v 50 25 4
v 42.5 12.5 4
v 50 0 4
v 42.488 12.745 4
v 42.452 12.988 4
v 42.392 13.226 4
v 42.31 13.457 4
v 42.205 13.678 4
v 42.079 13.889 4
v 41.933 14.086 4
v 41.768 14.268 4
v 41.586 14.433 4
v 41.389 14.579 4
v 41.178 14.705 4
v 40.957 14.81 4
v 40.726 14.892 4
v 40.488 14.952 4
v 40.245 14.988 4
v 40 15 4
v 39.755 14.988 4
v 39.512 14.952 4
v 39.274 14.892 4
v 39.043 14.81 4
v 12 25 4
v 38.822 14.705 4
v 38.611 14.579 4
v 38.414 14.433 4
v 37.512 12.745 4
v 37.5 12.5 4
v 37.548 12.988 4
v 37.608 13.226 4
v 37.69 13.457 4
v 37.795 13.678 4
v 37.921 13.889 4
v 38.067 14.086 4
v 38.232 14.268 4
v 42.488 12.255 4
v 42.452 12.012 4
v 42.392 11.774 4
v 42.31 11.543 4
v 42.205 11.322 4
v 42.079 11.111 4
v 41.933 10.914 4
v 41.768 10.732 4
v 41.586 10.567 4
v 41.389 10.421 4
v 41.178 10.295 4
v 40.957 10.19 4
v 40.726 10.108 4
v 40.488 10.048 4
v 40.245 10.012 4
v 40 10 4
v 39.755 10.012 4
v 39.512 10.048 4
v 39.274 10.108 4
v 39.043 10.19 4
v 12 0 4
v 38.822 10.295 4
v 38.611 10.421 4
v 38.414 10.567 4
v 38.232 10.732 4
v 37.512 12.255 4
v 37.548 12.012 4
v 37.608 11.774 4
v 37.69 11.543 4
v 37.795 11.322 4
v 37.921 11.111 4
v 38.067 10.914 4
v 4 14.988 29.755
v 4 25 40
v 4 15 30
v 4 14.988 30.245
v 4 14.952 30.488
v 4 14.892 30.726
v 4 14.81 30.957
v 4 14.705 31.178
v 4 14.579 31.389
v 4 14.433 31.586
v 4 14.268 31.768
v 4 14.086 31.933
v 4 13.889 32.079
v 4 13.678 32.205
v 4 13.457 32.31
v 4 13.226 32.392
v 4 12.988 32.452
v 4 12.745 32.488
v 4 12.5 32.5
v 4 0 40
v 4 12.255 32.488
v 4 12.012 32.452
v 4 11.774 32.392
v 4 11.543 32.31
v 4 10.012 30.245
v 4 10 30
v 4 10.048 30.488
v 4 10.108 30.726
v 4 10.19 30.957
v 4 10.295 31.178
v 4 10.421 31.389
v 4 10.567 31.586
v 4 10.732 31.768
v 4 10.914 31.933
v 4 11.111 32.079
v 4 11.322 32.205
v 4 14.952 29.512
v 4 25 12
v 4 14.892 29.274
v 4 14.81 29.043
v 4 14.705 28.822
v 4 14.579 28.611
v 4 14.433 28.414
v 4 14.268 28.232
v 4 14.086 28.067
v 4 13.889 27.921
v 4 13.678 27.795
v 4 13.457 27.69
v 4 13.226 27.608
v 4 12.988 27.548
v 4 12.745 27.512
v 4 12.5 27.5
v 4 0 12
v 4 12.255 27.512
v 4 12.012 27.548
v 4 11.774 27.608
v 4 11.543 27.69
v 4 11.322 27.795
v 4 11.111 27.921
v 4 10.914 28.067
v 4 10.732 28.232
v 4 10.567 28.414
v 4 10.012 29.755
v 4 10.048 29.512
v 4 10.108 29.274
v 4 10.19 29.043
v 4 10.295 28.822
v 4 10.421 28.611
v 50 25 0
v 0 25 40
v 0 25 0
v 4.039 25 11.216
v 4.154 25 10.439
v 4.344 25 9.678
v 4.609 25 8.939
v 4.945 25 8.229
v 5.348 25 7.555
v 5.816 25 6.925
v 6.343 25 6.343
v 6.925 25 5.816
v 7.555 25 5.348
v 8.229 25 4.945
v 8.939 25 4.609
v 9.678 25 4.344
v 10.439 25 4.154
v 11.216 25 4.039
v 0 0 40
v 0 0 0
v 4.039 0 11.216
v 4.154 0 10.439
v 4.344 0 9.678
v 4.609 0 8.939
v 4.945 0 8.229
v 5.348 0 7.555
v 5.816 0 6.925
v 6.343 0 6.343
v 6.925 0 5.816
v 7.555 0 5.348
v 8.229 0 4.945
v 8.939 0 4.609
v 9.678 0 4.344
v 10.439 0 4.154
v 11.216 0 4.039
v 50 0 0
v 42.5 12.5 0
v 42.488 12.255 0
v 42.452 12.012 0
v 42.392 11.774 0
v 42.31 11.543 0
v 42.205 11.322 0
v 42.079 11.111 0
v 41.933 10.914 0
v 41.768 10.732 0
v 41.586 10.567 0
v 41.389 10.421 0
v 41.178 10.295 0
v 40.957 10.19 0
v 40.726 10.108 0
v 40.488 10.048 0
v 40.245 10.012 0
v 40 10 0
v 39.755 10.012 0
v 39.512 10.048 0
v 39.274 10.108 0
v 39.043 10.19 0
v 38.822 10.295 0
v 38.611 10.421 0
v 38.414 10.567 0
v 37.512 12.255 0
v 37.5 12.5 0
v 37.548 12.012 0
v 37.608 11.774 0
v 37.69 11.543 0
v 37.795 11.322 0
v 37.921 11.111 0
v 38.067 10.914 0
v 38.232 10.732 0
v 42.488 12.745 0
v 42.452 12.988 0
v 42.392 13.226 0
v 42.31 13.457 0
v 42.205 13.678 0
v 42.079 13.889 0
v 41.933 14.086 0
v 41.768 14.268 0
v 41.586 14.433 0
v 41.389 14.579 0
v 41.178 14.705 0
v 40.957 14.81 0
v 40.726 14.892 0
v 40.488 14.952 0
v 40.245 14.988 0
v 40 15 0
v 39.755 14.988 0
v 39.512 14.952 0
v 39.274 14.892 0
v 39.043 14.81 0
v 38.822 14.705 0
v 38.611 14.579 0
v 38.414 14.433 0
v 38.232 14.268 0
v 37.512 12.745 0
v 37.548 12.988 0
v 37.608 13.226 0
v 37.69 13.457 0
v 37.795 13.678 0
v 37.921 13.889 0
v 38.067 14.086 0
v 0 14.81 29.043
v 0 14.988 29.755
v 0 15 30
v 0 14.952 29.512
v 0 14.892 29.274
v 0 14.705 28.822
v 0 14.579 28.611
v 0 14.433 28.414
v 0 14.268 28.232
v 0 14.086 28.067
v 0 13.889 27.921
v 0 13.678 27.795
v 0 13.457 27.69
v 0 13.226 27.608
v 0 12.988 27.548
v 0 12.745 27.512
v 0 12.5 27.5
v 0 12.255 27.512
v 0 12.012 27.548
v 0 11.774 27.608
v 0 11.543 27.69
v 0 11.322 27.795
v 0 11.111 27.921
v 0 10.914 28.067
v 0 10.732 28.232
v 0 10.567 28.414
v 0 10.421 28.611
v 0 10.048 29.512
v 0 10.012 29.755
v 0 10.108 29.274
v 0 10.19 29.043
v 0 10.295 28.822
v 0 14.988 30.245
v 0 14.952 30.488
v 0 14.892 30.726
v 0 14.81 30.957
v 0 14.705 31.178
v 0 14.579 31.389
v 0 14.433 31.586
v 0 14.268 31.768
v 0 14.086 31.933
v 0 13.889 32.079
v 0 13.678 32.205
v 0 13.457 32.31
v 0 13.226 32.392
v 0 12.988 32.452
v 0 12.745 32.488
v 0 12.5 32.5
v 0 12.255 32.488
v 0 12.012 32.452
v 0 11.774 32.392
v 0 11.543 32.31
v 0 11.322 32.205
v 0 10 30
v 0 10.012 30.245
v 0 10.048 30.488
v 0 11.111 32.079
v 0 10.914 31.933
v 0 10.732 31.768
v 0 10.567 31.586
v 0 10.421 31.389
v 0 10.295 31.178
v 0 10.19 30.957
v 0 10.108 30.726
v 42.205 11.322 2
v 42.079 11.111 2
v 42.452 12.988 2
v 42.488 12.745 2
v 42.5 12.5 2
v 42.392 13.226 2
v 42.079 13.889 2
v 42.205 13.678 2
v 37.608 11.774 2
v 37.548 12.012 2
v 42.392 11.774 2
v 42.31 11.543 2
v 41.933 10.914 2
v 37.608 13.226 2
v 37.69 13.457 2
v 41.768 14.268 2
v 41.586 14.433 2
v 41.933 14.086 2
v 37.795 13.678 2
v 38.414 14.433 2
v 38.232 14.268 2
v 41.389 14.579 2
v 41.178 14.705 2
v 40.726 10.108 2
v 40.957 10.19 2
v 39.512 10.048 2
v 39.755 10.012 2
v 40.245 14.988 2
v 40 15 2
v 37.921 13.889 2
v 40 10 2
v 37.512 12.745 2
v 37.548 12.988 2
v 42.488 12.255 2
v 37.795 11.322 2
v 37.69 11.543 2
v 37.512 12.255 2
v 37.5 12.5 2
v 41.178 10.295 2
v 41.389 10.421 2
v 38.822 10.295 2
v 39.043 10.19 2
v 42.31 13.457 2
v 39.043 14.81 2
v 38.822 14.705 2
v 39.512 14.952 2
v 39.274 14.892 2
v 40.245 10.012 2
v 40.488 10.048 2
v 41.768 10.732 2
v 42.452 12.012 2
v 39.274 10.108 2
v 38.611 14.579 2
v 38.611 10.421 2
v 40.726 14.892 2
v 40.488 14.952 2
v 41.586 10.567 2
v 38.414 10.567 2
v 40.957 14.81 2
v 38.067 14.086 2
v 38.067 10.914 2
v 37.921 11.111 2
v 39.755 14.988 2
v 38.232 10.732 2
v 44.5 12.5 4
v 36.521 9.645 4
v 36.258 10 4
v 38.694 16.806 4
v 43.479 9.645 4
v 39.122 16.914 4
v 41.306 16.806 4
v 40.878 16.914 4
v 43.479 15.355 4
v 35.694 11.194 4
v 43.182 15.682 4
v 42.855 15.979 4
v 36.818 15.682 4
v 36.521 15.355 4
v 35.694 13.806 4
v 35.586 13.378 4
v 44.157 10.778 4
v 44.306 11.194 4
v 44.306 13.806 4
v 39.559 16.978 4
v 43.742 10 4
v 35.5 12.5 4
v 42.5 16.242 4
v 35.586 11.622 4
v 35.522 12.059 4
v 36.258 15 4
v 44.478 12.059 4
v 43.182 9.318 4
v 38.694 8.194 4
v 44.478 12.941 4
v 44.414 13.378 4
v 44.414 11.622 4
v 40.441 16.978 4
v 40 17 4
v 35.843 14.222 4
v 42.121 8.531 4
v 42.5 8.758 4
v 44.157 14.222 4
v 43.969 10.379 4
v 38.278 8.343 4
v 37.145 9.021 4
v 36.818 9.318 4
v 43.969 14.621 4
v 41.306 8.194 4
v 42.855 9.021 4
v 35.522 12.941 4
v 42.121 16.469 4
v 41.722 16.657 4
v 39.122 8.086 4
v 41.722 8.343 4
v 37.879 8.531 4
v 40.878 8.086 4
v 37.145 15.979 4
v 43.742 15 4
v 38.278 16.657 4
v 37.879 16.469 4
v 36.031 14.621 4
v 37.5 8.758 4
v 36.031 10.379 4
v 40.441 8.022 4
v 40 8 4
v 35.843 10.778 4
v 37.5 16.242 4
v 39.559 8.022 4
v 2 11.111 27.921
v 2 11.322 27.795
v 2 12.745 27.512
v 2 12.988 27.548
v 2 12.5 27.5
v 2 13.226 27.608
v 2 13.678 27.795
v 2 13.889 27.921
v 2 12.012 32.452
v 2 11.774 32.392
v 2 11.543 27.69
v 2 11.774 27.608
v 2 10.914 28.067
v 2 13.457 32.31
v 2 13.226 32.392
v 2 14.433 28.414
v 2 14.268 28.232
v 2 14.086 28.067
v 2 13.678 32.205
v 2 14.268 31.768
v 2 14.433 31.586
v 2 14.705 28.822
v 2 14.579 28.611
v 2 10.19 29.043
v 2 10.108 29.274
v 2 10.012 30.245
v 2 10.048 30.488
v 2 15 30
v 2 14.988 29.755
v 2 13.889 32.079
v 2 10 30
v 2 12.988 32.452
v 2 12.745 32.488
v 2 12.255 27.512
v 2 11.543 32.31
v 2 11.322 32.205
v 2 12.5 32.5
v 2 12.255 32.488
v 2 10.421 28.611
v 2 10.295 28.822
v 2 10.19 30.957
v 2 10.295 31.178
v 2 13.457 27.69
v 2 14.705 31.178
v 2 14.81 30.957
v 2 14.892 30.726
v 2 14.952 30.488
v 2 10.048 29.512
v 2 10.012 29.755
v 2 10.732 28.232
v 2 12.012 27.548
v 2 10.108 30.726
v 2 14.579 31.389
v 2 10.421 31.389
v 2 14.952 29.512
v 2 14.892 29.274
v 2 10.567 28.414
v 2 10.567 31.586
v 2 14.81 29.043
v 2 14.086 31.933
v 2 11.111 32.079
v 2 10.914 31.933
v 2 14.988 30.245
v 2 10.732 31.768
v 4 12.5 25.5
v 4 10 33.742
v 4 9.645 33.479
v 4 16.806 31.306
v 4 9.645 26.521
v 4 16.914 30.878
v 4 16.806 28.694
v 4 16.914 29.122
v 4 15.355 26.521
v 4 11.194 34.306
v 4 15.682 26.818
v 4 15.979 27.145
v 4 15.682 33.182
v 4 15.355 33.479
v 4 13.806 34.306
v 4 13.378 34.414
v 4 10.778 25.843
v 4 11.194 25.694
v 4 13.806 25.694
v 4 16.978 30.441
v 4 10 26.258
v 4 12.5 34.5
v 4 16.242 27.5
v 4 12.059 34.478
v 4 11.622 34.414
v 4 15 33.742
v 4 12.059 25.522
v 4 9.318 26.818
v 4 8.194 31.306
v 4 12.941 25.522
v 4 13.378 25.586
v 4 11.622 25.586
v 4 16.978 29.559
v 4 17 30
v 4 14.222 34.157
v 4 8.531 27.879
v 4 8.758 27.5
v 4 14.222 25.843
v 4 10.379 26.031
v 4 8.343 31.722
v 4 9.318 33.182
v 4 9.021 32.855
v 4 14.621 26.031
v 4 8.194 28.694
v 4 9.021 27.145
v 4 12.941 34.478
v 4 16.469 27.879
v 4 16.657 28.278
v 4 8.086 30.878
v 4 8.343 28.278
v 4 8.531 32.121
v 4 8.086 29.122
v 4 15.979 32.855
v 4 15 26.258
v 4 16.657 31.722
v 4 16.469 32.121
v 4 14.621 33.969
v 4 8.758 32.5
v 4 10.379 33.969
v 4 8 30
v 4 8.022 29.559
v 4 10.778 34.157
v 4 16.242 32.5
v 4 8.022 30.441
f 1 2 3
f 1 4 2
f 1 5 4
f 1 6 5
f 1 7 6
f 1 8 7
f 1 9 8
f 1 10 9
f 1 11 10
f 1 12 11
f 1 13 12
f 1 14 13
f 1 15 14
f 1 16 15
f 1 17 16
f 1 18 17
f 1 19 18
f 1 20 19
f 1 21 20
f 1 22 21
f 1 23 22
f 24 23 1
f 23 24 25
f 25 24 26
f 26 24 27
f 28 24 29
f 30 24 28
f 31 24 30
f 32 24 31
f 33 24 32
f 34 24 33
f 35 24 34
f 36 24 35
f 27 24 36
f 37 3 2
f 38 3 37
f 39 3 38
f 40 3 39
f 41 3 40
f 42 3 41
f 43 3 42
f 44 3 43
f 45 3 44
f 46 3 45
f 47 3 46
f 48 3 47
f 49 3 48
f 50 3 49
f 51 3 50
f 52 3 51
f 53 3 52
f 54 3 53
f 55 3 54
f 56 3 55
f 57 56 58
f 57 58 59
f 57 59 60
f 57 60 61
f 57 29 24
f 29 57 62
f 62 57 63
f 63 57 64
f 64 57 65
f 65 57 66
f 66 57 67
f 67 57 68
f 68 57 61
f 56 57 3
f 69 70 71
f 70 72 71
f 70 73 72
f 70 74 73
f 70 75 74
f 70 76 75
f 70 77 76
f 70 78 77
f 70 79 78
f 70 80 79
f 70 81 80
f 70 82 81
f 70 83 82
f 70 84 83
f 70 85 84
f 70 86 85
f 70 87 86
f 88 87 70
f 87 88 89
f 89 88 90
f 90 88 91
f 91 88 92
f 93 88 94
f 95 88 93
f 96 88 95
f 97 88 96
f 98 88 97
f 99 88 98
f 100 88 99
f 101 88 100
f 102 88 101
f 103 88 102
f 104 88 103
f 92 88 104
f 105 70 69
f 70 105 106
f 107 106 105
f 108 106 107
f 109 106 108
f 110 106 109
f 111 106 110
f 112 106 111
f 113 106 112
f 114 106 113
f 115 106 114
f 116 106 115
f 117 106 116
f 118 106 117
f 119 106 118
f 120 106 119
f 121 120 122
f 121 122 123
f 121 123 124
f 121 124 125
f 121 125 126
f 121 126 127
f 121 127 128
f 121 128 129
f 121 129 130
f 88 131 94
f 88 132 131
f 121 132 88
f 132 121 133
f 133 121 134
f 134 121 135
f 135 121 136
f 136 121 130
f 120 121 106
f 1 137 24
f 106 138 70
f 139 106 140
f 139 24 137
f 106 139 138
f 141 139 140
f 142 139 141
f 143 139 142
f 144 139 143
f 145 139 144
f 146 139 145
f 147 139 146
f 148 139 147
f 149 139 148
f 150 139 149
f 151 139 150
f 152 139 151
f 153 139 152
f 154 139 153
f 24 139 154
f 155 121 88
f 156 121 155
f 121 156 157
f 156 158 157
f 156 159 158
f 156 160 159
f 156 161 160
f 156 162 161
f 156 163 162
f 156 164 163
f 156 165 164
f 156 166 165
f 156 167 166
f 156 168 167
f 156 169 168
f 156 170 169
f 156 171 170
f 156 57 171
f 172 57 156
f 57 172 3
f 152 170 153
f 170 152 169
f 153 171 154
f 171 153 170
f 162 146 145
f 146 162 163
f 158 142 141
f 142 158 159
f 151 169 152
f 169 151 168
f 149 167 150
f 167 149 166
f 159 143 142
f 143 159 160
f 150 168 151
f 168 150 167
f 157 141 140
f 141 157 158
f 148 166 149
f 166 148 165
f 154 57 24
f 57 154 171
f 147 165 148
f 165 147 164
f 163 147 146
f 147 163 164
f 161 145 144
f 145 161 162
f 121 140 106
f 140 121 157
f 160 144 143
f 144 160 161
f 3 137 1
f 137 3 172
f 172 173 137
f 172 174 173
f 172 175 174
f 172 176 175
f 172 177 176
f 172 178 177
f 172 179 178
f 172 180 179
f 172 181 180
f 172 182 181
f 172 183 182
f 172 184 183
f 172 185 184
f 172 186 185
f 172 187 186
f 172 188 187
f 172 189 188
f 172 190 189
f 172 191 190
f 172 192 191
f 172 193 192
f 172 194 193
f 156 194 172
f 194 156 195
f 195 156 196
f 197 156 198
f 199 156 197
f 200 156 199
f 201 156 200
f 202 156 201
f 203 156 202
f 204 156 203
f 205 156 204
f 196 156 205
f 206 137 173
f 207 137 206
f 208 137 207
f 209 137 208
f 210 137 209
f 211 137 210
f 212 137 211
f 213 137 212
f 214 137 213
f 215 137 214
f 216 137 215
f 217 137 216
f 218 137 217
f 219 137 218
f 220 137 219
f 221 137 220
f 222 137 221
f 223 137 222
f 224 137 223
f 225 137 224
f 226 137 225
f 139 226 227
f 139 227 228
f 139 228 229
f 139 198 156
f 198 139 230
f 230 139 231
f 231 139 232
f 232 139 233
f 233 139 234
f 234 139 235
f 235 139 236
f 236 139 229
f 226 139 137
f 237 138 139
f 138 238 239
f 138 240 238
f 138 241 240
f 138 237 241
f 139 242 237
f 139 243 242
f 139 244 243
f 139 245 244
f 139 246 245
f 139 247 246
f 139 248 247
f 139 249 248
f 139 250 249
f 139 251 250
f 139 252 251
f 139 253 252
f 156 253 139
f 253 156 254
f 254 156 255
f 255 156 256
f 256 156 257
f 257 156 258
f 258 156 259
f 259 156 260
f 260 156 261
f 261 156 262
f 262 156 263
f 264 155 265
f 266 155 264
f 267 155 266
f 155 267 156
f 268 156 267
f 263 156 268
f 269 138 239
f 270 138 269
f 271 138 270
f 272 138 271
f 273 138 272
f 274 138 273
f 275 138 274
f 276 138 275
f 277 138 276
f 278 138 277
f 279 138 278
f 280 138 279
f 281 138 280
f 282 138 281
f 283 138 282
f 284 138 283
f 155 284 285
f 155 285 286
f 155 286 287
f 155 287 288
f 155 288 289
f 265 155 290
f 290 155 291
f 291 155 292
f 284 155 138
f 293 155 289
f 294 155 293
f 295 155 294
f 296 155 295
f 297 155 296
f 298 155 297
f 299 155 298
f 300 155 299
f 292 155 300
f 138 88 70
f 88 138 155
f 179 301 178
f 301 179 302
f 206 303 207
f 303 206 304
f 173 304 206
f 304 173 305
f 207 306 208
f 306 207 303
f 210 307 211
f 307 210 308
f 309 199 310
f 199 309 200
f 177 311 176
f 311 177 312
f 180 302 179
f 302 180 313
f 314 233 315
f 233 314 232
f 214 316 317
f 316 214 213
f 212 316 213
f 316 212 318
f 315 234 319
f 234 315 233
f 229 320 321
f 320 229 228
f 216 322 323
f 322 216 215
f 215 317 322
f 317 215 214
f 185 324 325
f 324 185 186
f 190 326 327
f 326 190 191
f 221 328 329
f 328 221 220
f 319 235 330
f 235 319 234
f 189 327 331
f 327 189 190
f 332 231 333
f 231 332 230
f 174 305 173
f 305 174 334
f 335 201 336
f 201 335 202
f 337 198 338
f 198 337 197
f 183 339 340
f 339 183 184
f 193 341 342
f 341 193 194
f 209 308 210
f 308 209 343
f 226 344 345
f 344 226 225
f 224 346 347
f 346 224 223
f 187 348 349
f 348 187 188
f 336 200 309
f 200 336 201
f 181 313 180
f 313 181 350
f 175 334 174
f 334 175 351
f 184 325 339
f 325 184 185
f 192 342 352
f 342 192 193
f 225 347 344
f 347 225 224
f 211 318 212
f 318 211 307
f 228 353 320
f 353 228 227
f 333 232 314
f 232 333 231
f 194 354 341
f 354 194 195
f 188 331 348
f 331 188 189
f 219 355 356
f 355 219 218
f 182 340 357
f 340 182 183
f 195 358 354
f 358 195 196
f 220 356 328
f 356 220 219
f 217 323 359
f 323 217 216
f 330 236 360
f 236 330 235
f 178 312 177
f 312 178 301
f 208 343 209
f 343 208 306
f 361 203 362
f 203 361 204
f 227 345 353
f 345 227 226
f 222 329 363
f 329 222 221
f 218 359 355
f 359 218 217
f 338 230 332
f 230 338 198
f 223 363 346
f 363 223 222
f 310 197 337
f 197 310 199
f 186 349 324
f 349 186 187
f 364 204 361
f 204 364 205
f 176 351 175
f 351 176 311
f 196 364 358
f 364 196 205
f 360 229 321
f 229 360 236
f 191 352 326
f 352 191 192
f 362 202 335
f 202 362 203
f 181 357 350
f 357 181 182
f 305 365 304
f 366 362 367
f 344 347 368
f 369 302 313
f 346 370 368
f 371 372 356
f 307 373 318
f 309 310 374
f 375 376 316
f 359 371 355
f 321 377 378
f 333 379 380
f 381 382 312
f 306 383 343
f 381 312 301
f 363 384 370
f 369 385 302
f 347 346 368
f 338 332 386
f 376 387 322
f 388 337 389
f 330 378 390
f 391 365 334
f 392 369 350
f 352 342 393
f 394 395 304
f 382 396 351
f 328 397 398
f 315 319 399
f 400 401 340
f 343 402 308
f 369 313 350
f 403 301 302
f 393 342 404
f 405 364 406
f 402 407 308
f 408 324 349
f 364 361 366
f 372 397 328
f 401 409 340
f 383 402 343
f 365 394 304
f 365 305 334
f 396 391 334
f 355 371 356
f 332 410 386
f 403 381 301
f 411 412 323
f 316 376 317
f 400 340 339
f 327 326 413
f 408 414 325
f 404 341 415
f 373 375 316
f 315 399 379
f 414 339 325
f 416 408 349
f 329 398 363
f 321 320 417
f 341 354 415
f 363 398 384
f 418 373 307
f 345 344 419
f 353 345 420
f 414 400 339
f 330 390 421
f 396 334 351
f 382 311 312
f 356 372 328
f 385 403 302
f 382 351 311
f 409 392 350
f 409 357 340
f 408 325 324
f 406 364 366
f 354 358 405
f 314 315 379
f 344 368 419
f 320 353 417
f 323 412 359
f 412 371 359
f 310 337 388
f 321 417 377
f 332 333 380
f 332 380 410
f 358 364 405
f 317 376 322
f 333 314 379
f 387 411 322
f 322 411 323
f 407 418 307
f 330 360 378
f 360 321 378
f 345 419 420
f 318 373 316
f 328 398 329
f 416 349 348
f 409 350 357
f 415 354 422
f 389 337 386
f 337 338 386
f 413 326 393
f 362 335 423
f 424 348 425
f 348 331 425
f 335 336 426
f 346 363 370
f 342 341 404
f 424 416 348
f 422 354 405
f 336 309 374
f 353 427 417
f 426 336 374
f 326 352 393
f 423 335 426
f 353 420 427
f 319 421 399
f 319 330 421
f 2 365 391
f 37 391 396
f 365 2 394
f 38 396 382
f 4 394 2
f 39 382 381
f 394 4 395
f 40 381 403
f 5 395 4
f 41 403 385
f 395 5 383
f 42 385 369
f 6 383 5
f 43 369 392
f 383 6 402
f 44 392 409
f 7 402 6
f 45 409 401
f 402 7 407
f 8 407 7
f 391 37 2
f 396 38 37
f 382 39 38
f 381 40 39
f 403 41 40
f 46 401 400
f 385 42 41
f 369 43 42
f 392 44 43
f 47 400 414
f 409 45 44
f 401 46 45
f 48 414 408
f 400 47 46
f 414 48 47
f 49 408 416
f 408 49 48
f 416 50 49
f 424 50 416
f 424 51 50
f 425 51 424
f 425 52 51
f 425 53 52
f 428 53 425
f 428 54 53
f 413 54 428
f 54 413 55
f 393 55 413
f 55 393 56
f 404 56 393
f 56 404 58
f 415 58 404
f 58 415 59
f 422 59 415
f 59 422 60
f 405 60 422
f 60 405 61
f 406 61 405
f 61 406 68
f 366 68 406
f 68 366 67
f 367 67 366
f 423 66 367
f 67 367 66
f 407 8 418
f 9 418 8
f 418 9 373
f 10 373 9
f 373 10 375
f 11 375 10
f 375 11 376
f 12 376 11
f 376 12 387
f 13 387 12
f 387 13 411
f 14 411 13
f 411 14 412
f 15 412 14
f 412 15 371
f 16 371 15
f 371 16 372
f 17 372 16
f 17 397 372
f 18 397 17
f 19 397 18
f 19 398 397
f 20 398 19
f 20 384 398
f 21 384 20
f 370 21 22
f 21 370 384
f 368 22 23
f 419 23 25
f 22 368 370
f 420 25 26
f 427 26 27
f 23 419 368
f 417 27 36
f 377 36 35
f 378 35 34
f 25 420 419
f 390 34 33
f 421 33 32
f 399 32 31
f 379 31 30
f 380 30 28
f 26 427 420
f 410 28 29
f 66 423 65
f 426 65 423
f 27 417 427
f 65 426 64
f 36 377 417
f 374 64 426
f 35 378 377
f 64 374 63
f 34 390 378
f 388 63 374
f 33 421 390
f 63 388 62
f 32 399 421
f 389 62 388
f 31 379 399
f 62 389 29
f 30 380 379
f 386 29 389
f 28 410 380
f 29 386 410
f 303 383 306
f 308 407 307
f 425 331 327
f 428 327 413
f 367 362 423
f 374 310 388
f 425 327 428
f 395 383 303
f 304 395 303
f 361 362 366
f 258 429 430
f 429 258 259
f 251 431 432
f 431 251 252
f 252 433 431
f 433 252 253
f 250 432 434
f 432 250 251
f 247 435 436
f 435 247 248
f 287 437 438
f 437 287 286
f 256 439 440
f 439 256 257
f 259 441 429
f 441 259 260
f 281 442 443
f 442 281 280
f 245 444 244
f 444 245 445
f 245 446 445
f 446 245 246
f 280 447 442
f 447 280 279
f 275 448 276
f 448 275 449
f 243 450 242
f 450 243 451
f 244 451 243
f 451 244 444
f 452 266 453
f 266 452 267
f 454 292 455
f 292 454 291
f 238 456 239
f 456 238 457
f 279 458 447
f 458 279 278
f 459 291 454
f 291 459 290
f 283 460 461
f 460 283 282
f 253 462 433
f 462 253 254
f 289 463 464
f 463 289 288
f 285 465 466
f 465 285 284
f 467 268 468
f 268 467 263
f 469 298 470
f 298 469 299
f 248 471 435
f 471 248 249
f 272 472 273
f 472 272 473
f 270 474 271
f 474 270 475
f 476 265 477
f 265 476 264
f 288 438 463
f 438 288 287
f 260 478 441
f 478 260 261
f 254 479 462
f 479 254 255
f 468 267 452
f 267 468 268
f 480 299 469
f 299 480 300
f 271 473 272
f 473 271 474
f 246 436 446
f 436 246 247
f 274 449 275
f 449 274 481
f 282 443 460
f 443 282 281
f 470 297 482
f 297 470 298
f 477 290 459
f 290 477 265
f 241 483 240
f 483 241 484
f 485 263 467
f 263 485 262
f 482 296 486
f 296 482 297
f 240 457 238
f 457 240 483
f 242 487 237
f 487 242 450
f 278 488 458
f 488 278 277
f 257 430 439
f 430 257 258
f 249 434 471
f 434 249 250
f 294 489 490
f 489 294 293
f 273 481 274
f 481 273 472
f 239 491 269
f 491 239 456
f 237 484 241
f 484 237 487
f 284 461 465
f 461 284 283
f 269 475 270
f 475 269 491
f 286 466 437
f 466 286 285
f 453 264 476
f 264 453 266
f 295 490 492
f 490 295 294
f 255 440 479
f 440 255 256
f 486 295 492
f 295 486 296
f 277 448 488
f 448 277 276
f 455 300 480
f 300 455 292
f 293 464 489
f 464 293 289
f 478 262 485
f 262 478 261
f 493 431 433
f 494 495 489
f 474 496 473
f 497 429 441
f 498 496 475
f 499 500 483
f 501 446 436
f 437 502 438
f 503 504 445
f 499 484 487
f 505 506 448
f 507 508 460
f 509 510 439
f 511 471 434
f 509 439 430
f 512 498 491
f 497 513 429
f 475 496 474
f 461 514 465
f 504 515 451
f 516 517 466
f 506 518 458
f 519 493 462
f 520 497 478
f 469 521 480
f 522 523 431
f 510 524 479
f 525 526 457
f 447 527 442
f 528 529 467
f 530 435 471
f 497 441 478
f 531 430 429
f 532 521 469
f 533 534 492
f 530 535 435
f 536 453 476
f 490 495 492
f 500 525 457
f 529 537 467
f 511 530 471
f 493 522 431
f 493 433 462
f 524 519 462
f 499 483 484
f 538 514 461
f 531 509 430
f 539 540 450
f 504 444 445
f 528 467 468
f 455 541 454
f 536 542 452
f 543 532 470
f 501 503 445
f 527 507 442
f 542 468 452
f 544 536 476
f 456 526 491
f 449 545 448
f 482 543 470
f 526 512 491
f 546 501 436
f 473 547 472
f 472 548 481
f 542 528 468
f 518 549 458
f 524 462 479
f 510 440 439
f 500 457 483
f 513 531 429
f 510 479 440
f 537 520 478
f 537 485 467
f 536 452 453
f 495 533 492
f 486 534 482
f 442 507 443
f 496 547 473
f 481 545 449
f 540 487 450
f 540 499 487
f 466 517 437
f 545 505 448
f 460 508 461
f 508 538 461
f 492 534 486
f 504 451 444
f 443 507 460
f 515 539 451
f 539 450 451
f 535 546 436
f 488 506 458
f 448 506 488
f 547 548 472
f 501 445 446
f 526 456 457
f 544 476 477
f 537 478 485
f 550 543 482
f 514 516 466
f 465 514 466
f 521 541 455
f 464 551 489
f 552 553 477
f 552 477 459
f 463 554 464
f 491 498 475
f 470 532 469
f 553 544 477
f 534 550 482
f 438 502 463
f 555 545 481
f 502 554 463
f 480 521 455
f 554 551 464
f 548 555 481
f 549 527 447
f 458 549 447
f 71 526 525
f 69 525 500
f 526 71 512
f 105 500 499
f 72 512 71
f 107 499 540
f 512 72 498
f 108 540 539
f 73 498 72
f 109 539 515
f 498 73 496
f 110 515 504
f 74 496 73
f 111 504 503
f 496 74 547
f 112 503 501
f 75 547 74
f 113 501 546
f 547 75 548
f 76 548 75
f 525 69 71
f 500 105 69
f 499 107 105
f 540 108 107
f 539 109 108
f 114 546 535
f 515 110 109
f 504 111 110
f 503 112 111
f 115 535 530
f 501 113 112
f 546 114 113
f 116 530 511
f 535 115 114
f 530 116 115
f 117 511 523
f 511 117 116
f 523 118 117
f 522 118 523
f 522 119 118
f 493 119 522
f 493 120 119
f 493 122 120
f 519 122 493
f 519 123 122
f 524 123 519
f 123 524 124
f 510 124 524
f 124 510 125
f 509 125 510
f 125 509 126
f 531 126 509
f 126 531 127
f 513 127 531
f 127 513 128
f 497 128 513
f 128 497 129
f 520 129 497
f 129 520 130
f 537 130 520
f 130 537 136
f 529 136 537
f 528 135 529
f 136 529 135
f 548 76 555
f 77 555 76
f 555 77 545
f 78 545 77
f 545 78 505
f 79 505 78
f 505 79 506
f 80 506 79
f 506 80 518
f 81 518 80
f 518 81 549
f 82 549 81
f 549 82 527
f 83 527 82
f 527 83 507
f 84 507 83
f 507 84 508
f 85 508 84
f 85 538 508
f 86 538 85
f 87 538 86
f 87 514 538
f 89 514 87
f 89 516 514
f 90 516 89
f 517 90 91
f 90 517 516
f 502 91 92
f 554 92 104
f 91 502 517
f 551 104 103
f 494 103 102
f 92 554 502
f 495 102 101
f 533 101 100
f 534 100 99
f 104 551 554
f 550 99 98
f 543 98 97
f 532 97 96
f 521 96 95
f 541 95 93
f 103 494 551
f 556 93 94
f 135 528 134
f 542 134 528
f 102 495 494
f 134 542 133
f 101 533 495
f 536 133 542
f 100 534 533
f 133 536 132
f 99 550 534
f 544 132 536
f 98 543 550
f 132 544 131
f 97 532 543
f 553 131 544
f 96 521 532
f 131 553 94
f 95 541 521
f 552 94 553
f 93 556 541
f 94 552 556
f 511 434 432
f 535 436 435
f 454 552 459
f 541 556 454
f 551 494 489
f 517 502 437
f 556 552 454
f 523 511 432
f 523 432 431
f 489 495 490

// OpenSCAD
// ============================================
// Template: L-Bracket with Mounting Holes
// Description: Adjustable L-bracket for wall/shelf mounting
// ============================================

// --- Parameters ---
arm_length = 50;     // [mm] horizontal arm
leg_length = 40;     // [mm] vertical leg
width = 25;          // [mm] bracket width
thickness = 4;       // [mm] material thickness
fillet_r = 8;        // [mm] inner fillet radius

// Mounting holes
hole_d = 5;          // [mm] hole diameter
hole_inset = 10;     // [mm] hole center from edges
countersink = true;  // countersink holes
cs_d = 9;            // [mm] countersink diameter
cs_depth = 2;        // [mm] countersink depth

// --- Quality ---
$fn = 64;

// --- Render ---
bracket();

// --- Modules ---
module bracket() {
    difference() {
        union() {
            // Horizontal arm
            cube([arm_length, width, thickness]);

            // Vertical leg
            cube([thickness, width, leg_length]);

            // Inner fillet for strength
            translate([thickness, 0, thickness])
                fillet(fillet_r, width);
        }

        // Arm mounting holes
        translate([arm_length - hole_inset, width/2, -0.01])
            mounting_hole(hole_d, thickness, countersink, cs_d, cs_depth);

        // Leg mounting holes
        translate([-0.01, width/2, leg_length - hole_inset])
            rotate([0, 90, 0])
                mounting_hole(hole_d, thickness, countersink, cs_d, cs_depth);
    }
}

module fillet(r, w) {
    difference() {
        cube([r, w, r]);
        translate([r, -0.01, r])
            rotate([-90, 0, 0])
                cylinder(r=r, h=w + 0.02);
    }
}

module mounting_hole(d, h, countersink=false, cs_d=0, cs_depth=0) {
    union() {
        cylinder(d=d, h=h + 0.02);
        if (countersink) {
            translate([0, 0, h - cs_depth + 0.01])
                cylinder(d1=d, d2=cs_d, h=cs_depth);
        }
    }
}
